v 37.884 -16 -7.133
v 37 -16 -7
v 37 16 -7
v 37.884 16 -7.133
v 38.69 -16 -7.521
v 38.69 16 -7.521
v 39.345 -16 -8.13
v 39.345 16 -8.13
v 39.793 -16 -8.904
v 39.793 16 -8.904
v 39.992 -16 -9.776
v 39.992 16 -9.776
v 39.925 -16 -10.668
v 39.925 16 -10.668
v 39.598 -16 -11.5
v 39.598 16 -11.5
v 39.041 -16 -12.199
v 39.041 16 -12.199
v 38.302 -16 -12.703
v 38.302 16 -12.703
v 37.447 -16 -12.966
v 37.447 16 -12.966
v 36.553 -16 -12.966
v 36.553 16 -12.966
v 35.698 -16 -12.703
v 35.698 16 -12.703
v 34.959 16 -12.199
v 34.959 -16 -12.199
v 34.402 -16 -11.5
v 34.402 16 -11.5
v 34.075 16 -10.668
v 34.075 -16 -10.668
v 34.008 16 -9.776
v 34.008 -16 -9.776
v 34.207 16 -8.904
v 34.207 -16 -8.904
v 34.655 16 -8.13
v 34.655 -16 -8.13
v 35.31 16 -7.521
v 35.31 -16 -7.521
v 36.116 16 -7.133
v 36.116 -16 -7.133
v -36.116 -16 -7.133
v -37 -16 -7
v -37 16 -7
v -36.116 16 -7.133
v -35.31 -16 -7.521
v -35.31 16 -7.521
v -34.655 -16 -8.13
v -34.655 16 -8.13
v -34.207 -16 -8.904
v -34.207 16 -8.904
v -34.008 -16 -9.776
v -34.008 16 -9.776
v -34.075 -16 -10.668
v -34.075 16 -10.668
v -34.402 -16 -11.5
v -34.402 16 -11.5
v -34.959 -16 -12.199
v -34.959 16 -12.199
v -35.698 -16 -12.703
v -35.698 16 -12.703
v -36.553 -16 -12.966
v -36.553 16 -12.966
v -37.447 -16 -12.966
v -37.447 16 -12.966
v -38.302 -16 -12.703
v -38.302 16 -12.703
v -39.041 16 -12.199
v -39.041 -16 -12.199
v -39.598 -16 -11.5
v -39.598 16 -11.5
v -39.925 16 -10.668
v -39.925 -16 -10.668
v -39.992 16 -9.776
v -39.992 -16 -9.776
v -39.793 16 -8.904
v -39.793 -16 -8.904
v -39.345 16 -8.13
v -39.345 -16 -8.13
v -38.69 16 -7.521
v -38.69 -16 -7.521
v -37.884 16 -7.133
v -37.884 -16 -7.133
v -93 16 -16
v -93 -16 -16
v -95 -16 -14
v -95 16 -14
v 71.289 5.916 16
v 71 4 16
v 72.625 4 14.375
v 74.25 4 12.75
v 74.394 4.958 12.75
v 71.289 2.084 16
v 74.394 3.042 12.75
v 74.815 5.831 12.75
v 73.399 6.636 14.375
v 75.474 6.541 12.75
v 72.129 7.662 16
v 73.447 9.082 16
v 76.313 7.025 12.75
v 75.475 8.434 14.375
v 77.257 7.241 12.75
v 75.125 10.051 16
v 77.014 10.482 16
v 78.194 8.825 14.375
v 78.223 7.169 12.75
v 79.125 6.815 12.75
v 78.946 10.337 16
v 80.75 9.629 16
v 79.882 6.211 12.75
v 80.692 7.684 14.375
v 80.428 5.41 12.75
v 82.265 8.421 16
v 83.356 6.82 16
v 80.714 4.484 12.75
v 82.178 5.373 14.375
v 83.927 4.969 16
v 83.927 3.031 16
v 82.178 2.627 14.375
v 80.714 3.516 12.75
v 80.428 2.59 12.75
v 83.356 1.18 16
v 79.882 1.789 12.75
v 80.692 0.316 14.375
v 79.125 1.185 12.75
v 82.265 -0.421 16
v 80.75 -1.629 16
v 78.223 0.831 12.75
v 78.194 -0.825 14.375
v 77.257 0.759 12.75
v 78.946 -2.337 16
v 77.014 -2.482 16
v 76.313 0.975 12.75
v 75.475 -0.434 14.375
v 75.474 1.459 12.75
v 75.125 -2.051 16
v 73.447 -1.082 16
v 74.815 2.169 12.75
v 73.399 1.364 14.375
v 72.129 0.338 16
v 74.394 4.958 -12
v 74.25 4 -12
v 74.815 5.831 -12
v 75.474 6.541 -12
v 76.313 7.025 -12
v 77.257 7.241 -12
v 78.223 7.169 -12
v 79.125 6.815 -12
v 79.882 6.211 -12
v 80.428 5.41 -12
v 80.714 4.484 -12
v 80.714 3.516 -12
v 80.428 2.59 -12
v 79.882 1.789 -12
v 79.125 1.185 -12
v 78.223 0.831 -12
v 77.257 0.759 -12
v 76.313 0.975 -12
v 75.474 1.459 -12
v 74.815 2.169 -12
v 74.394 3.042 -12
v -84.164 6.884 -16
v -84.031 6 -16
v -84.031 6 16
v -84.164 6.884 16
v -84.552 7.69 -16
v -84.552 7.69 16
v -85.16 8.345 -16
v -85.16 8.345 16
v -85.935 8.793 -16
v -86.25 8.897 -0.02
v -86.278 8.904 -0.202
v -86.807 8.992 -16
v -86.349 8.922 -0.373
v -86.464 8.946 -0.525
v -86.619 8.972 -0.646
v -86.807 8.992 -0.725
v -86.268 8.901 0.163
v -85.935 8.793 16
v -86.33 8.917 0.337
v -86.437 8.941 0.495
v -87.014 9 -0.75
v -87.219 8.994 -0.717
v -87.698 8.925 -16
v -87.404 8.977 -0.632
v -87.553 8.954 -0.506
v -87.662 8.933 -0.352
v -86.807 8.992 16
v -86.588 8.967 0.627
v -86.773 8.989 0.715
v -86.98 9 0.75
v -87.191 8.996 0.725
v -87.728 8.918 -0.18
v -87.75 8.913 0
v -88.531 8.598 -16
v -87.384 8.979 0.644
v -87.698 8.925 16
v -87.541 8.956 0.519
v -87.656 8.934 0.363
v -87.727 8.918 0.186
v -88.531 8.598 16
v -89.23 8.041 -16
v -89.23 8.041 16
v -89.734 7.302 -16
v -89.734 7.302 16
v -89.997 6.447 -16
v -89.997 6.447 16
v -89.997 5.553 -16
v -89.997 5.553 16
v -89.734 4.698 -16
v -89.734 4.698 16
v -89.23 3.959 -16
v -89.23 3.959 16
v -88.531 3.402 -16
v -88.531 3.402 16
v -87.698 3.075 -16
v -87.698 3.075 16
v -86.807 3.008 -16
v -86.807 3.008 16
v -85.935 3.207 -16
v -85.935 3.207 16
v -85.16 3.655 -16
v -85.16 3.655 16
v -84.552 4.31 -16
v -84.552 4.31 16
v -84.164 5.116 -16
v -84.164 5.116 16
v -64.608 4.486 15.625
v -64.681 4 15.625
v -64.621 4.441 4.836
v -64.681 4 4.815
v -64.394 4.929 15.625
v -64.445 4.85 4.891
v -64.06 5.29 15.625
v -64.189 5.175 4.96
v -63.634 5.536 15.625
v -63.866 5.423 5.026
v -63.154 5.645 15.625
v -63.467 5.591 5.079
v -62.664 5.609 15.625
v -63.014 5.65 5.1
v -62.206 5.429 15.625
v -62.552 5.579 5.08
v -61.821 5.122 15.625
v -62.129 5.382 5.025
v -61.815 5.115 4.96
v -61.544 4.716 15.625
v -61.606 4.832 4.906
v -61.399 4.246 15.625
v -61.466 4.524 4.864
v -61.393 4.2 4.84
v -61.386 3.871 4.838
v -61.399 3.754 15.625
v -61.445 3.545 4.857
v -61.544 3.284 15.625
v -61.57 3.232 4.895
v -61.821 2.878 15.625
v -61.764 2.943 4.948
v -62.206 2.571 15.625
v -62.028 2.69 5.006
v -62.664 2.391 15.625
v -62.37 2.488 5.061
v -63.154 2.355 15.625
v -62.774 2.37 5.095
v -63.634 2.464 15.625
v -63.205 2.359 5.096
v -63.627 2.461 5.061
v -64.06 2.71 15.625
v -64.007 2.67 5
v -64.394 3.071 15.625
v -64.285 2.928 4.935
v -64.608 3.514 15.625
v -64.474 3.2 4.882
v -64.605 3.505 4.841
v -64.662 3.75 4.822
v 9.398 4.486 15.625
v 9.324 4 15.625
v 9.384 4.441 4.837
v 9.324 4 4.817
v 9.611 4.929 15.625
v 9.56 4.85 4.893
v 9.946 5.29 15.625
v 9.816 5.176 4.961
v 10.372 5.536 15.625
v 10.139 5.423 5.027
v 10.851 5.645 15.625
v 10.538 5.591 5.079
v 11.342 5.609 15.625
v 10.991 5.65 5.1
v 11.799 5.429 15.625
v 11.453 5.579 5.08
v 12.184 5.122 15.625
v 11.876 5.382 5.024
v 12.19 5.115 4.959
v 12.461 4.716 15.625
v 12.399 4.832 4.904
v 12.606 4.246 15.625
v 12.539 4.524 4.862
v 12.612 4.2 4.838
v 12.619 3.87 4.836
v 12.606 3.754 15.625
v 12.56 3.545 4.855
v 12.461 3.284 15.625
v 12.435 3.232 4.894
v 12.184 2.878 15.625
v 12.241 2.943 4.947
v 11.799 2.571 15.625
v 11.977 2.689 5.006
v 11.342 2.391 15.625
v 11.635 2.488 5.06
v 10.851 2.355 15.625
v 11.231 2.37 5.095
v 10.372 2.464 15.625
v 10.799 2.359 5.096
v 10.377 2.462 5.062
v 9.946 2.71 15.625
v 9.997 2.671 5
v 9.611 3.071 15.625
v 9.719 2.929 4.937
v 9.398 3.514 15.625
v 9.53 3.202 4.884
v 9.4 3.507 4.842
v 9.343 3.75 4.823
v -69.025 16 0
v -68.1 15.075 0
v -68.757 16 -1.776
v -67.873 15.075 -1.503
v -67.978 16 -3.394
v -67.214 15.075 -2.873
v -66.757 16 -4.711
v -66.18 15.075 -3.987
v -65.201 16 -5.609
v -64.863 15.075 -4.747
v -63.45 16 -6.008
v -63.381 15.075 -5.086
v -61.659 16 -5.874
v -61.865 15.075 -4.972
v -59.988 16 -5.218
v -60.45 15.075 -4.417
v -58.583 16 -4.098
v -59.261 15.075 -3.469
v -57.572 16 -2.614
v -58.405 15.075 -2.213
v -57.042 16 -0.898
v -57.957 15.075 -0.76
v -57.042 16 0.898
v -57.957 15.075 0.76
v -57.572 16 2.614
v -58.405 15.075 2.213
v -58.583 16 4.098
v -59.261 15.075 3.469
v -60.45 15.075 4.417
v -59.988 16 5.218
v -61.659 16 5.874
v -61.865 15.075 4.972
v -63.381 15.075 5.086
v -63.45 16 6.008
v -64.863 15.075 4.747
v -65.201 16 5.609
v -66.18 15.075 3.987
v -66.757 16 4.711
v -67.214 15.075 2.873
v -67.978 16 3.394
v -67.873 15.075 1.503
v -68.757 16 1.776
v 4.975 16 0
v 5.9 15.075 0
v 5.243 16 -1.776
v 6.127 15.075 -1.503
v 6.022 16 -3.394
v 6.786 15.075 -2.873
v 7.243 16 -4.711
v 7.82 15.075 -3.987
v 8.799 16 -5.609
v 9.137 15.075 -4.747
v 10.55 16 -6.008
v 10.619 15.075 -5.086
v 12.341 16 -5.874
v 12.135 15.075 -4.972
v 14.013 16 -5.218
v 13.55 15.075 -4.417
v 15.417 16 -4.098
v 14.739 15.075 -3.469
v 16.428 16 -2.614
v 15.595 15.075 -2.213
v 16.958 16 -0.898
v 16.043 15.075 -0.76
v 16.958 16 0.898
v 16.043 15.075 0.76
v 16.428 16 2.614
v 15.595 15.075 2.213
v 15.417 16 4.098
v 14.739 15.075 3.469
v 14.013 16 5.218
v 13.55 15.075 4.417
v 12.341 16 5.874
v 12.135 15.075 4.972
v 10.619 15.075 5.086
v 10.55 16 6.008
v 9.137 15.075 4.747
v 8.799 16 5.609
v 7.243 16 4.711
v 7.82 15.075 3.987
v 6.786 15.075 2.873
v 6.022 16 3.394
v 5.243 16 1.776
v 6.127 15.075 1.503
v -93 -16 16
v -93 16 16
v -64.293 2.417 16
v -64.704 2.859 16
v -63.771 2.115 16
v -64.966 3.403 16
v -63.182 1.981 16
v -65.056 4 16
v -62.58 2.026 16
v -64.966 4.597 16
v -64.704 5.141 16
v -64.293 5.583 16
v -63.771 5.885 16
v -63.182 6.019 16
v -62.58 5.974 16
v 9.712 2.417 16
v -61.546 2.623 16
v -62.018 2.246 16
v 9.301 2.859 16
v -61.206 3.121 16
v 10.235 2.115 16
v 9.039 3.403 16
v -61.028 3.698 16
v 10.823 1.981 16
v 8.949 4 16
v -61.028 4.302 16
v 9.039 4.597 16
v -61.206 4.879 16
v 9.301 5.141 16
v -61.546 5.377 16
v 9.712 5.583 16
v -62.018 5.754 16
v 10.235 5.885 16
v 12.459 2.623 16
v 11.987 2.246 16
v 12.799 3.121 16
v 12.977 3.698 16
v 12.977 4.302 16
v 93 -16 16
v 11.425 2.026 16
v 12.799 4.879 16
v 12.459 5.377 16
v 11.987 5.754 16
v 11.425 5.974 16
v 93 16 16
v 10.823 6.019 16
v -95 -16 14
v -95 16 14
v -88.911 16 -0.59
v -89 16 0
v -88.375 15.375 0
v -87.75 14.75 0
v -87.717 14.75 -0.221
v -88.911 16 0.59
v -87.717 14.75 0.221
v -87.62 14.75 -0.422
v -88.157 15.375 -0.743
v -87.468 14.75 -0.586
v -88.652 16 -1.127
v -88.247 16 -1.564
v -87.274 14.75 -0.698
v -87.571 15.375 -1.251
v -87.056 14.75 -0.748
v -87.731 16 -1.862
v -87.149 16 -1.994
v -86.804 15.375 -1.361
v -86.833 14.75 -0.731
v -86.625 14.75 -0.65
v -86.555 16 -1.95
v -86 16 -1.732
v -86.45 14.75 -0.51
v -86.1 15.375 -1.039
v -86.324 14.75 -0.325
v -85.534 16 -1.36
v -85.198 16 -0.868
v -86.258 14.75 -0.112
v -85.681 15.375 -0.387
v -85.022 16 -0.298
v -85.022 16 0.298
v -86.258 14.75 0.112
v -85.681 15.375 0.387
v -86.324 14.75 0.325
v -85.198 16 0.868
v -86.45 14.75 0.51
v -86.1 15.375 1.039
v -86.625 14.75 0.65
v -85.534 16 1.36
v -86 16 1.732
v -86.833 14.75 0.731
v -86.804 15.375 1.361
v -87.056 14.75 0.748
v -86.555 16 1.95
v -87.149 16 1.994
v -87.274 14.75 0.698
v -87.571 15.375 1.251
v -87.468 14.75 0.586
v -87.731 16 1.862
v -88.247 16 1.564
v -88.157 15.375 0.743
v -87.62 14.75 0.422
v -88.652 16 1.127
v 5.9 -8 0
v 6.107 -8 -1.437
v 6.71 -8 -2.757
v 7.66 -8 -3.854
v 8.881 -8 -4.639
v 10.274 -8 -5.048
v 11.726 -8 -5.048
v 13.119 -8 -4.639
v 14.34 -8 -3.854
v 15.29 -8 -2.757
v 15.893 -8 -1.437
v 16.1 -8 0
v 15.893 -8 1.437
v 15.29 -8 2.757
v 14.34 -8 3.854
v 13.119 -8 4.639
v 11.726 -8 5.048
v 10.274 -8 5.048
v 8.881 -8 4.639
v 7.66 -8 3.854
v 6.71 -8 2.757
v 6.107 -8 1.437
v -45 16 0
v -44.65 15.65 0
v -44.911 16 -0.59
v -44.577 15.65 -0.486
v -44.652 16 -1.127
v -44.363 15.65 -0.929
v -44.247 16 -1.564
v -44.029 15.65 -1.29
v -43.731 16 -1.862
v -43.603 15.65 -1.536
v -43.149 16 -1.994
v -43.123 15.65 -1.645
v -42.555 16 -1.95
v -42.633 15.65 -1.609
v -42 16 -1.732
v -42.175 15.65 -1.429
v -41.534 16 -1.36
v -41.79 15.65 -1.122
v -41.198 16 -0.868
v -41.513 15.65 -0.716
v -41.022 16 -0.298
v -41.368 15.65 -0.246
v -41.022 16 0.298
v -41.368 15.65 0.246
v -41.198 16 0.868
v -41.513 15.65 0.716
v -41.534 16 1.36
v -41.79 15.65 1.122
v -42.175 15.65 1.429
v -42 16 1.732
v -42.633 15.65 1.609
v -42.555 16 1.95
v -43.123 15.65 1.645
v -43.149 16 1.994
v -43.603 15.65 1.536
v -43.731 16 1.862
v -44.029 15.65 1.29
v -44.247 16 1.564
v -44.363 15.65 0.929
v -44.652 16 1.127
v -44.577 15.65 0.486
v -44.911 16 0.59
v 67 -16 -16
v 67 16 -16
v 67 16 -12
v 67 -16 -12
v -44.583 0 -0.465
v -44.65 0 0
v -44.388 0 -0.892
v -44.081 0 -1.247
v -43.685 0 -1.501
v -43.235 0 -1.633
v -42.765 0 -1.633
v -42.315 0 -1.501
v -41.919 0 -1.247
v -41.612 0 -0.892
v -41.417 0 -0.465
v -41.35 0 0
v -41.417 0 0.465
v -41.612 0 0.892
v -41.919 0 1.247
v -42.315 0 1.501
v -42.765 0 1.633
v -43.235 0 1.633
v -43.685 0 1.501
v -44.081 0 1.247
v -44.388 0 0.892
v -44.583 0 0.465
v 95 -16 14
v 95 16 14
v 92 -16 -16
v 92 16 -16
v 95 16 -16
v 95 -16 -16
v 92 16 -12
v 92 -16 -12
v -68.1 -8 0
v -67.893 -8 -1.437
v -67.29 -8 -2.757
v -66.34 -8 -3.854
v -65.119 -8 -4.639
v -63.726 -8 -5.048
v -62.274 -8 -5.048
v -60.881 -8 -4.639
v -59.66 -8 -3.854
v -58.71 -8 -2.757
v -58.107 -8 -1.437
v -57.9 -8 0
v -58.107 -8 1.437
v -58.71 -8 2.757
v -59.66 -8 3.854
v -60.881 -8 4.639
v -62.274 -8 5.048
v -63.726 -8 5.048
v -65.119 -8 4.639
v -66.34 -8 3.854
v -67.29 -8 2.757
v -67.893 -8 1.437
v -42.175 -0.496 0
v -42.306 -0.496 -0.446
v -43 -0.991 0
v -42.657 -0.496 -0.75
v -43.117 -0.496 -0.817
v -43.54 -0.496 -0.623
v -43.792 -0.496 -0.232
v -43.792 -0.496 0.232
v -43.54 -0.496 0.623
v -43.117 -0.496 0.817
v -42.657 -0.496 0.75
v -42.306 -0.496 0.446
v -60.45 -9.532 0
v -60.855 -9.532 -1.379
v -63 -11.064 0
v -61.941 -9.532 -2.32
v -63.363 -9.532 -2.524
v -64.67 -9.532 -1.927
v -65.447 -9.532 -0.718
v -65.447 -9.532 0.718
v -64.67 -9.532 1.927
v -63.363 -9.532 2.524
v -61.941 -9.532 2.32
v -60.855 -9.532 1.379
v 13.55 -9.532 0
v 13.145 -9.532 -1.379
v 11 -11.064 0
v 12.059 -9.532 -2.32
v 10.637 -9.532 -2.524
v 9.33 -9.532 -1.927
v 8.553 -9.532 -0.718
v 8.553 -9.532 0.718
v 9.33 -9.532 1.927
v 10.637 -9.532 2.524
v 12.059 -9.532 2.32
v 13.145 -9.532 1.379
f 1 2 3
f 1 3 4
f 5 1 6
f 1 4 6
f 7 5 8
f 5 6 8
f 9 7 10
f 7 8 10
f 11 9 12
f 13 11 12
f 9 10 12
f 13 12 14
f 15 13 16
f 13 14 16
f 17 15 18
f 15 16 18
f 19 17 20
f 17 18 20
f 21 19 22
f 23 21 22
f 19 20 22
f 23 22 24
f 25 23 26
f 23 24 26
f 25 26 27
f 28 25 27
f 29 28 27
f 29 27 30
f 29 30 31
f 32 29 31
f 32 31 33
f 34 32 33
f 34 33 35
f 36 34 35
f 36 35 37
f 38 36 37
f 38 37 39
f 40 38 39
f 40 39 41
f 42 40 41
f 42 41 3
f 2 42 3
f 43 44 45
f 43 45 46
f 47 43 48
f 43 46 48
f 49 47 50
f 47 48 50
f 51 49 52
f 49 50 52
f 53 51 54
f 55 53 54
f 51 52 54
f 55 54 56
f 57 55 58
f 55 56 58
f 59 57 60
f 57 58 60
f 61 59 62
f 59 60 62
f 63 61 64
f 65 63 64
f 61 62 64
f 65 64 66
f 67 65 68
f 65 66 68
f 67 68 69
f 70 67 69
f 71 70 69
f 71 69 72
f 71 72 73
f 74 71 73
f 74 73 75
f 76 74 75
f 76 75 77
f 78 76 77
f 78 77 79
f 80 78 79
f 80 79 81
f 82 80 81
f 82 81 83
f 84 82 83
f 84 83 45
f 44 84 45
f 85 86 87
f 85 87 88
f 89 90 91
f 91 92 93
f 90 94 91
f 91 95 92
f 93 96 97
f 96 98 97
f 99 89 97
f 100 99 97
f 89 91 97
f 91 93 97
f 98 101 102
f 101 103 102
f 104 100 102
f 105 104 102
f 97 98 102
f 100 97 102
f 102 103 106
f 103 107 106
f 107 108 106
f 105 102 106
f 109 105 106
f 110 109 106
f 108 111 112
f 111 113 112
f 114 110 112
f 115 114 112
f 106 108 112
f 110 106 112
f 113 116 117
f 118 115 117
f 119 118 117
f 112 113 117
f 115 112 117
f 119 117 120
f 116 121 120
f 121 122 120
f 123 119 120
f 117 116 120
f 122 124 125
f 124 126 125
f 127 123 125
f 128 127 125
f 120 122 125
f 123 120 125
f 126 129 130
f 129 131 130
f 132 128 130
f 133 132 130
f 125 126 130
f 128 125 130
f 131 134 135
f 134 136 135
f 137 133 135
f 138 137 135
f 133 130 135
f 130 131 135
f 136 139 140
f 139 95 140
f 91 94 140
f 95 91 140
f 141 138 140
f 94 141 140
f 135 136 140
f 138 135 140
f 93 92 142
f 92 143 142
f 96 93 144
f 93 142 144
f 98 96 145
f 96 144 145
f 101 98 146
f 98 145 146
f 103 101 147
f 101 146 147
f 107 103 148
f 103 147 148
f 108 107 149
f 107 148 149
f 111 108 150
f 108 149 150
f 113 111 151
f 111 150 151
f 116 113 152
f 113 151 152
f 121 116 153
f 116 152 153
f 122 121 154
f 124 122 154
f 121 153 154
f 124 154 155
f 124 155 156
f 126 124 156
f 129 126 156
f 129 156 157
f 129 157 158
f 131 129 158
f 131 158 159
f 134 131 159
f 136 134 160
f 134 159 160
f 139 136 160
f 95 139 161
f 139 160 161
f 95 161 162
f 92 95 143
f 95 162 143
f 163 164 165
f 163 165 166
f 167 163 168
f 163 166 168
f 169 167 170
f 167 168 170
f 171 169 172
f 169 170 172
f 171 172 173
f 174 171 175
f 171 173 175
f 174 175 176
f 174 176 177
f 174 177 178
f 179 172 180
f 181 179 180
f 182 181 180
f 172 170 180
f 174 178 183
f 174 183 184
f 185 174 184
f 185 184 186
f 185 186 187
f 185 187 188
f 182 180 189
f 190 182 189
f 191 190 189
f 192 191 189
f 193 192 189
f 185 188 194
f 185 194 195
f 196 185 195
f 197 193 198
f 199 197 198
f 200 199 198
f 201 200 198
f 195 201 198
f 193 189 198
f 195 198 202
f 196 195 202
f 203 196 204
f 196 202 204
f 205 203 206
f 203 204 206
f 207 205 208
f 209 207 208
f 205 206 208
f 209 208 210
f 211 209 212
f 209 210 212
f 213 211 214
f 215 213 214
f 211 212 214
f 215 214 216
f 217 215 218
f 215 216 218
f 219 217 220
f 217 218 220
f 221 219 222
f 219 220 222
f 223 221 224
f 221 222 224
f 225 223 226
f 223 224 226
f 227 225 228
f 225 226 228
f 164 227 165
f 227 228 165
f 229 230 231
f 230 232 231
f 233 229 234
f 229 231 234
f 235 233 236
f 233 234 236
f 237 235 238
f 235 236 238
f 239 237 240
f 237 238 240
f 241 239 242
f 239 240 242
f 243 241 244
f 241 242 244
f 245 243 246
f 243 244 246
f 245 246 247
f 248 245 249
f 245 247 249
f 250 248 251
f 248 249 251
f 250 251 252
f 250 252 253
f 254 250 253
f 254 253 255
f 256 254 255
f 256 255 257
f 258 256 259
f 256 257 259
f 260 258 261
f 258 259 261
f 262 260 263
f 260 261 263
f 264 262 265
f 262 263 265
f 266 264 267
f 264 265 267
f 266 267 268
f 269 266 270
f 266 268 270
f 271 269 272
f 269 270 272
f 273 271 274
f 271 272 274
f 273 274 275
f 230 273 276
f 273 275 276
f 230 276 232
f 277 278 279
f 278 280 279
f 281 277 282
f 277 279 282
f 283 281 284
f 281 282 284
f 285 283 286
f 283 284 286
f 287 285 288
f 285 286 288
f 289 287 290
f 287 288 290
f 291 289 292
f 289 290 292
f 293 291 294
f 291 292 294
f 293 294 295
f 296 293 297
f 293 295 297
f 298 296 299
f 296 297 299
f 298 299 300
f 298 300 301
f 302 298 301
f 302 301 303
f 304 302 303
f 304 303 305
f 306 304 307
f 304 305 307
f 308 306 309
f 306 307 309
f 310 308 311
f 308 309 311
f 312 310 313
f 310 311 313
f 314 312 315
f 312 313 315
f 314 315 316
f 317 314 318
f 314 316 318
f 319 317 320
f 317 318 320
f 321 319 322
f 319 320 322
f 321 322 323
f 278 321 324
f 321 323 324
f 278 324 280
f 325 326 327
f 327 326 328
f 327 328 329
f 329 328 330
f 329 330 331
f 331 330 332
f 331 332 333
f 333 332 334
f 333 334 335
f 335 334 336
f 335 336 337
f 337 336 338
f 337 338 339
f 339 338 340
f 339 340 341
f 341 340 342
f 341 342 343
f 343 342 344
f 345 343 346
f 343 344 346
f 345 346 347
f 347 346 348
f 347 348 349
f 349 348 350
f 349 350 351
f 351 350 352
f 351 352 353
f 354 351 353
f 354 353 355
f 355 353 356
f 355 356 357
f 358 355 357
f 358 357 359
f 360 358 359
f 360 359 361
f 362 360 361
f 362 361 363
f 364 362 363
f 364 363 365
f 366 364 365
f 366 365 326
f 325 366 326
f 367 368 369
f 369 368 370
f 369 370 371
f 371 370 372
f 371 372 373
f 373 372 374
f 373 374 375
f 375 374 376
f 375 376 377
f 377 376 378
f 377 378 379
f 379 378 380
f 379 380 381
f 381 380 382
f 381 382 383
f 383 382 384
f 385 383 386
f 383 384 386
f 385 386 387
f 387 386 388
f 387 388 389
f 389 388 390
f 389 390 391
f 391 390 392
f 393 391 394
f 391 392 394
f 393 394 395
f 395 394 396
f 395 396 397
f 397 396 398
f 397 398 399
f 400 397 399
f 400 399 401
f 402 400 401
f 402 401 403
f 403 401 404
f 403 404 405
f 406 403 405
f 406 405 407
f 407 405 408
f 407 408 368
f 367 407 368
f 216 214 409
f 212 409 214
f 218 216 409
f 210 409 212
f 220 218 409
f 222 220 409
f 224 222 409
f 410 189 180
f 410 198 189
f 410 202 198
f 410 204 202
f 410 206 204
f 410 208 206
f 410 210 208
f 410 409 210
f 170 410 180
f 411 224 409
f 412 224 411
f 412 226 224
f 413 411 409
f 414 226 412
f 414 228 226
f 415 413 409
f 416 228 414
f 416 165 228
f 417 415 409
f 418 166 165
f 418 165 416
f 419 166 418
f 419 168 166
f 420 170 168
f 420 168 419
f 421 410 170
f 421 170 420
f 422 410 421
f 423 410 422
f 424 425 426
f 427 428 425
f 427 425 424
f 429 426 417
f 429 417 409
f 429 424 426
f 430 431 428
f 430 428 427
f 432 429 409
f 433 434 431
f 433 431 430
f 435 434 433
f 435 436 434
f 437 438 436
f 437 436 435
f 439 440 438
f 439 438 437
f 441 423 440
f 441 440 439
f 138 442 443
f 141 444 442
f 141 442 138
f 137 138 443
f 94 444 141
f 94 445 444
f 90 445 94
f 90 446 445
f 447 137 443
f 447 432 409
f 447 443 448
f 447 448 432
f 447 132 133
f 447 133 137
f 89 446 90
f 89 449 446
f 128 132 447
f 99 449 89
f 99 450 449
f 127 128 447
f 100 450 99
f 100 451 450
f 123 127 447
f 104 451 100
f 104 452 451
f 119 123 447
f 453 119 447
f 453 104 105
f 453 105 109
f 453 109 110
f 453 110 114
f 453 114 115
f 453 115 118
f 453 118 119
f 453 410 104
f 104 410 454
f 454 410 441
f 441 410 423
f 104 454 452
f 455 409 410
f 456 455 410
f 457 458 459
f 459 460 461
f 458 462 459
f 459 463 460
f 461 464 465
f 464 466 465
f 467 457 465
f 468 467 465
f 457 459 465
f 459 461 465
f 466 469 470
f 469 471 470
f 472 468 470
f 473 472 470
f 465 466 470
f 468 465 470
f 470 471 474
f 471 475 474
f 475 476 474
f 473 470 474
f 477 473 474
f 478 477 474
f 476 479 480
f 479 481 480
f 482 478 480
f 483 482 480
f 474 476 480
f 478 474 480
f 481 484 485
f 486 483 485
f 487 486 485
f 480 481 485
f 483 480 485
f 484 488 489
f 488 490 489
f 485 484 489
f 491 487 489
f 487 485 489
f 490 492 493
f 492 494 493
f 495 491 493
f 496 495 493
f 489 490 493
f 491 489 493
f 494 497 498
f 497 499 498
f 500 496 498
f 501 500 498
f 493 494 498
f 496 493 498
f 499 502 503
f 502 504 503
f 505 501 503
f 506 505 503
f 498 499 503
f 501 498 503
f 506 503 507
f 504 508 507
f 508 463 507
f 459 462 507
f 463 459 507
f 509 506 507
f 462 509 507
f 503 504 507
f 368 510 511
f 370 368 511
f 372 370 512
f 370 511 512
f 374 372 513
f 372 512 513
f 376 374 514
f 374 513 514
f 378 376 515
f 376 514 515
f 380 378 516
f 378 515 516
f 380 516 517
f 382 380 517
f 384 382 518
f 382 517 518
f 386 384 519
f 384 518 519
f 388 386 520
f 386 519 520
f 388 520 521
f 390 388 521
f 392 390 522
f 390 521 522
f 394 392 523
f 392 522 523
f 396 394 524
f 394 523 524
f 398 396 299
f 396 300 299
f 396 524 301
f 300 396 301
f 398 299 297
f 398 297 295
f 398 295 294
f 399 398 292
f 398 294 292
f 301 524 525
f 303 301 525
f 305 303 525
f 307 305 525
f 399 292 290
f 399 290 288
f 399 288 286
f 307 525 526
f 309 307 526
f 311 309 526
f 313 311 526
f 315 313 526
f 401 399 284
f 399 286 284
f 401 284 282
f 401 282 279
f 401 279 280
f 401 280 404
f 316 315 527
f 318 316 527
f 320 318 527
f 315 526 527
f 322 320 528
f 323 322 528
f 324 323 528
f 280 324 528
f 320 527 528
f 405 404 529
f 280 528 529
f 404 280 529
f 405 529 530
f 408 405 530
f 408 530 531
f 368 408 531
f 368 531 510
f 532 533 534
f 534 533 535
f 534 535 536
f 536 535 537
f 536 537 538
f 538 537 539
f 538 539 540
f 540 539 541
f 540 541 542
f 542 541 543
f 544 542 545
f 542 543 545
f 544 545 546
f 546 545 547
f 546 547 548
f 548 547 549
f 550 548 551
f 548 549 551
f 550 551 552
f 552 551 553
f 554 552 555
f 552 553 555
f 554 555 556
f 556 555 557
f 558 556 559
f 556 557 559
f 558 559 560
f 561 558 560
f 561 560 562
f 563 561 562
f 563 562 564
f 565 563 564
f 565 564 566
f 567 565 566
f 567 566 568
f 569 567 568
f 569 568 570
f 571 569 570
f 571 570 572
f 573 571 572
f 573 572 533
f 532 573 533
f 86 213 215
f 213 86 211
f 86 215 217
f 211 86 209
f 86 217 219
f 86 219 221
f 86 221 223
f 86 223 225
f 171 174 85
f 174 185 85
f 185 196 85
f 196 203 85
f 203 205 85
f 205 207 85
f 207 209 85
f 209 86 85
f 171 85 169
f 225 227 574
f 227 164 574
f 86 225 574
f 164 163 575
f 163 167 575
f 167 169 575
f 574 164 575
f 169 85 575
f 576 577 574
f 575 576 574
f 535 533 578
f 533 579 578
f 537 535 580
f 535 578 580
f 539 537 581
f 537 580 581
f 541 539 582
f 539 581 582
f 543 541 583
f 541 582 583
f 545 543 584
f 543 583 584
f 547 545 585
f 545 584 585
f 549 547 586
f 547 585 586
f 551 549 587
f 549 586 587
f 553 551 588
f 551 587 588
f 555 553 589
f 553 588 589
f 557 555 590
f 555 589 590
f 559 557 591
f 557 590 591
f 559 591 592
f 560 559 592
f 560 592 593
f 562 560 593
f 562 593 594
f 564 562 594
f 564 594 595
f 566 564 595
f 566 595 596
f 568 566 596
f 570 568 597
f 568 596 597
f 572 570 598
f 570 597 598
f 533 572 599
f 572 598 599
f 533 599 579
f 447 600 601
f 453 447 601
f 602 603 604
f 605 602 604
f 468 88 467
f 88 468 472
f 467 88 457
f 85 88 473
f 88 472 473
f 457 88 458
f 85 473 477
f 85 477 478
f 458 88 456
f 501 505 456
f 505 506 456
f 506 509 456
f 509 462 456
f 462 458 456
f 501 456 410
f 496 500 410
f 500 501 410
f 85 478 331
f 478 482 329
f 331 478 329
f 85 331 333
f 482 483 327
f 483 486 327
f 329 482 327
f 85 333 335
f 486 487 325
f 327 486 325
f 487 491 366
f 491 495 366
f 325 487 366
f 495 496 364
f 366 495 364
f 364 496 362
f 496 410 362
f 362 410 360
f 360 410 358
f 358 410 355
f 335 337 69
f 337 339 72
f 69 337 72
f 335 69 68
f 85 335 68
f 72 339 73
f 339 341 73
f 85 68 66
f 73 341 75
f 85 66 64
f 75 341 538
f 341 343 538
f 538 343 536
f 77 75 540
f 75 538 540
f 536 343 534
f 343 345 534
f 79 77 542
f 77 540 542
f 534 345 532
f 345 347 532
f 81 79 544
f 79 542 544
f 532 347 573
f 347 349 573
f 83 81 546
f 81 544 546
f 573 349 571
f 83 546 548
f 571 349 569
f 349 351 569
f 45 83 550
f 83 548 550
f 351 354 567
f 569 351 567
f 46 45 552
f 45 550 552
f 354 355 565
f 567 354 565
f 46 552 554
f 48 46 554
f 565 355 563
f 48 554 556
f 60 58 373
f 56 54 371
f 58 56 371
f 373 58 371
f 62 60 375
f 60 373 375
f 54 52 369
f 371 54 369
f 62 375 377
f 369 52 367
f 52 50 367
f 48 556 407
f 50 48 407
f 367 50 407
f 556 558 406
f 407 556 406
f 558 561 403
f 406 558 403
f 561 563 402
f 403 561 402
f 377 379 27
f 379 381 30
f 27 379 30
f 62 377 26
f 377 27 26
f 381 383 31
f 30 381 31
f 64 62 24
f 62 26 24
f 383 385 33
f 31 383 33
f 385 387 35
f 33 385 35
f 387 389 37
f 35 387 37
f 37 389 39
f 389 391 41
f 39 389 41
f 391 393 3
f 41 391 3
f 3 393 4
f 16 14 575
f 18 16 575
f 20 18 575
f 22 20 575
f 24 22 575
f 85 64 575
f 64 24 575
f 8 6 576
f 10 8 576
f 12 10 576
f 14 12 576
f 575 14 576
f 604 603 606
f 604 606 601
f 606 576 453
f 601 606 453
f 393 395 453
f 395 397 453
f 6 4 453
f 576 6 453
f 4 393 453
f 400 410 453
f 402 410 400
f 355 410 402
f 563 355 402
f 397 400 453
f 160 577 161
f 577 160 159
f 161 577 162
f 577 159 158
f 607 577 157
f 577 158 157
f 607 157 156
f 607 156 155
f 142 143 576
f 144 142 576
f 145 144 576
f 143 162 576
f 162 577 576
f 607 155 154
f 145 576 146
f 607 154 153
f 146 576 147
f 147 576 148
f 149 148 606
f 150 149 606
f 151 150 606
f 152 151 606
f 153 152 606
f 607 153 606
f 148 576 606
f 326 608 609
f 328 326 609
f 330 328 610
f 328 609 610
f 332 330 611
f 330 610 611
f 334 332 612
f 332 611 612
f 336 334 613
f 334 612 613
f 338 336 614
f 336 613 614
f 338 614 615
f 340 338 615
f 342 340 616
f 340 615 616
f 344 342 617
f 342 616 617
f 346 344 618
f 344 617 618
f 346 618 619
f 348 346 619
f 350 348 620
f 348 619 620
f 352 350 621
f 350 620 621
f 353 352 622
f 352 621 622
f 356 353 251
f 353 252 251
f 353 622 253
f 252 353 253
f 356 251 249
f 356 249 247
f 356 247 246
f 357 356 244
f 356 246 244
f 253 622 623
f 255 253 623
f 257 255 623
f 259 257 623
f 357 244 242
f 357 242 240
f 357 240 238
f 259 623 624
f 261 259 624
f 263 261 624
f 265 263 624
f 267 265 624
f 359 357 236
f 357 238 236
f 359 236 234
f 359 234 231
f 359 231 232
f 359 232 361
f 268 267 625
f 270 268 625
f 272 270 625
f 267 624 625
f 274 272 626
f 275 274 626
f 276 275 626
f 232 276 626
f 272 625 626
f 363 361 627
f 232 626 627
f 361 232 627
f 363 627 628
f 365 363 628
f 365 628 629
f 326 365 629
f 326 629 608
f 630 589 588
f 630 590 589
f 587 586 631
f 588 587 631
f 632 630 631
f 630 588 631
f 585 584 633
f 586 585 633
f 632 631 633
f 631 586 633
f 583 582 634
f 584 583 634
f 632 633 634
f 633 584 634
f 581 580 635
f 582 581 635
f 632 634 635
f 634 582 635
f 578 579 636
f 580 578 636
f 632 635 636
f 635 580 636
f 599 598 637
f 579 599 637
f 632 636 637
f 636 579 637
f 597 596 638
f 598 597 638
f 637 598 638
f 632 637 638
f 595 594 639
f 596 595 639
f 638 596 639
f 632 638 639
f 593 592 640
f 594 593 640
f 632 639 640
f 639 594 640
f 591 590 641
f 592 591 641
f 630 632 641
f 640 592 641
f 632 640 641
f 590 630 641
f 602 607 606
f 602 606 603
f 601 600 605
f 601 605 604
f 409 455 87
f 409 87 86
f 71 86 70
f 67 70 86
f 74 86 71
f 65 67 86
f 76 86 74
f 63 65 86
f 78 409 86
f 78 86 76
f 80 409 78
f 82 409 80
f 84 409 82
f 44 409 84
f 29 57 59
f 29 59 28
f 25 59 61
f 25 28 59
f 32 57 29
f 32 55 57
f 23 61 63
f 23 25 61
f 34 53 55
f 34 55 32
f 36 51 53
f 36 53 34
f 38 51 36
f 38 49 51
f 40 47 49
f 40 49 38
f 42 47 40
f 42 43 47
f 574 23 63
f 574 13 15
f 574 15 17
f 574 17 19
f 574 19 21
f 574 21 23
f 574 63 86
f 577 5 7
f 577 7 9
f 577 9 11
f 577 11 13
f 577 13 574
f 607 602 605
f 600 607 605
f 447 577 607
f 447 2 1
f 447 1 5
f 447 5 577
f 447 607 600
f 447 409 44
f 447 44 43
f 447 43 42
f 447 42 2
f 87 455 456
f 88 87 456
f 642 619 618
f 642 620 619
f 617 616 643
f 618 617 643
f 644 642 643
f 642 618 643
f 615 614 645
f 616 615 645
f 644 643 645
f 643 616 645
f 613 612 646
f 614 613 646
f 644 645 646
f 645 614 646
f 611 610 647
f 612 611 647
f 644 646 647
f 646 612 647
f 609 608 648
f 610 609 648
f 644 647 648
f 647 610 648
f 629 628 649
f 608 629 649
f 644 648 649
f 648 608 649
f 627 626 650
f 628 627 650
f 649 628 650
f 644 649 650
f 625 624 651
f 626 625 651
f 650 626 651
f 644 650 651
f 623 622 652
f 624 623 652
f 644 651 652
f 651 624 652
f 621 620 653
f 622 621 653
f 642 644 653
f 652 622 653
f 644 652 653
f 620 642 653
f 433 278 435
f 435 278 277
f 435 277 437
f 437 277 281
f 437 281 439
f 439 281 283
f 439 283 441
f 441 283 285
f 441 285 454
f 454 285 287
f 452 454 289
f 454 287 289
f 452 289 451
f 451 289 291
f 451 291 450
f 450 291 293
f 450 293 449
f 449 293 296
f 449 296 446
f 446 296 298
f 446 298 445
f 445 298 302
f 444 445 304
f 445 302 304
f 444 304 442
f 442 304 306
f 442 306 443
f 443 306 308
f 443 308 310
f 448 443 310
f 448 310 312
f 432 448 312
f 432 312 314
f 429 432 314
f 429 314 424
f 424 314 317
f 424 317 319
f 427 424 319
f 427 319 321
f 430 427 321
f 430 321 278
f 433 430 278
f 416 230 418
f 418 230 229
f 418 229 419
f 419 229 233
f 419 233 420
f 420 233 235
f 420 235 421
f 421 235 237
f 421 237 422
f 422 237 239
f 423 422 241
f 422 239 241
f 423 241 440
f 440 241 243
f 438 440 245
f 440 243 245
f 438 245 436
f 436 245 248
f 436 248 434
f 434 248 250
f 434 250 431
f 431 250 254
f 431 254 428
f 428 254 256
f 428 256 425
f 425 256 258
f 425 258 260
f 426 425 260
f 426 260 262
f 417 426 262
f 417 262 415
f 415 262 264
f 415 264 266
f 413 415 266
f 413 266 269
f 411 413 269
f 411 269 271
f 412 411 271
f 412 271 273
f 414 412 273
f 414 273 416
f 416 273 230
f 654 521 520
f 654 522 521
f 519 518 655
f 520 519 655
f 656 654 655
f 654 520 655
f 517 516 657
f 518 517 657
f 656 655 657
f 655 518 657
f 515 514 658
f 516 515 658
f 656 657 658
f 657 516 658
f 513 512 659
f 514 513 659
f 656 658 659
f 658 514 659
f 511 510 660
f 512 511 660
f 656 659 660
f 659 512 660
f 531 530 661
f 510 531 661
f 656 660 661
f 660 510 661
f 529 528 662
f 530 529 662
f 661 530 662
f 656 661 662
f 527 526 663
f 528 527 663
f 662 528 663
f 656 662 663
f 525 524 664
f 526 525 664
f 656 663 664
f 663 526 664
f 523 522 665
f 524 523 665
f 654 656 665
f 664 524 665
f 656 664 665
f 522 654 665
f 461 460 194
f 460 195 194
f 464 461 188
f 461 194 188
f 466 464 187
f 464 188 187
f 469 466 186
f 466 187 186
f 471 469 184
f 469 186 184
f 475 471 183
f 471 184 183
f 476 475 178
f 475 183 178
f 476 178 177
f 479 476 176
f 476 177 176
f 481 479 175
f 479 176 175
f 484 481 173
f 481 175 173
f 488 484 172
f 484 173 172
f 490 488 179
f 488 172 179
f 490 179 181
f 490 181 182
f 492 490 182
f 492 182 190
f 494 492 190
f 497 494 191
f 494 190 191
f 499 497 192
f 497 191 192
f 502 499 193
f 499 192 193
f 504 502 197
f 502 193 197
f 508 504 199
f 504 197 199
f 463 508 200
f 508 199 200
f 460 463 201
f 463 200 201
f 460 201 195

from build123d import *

# Parameters (mm, degrees)
SKETCH2_W                                            = 190
SKETCH2_H                                            = 32
BOSS_EXTRUDE2_DEPTH                                  = 16
CHAMFER1_SIZE                                        = 2
SKETCH3_W                                            = 25
SKETCH3_H                                            = 4
CUT_EXTRUDE1_DEPTH                                   = 102.513545894
M12_TAPPED_HOLE1_D                                   = 10.2
M12_TAPPED_HOLE1_DEPTH                               = 24
M12_TAPPED_HOLE1_CSINK_D                             = 12.05
M12_TAPPED_HOLE1_CSINK_ANGLE                         = 90
M12_TAPPED_HOLE1_TIP                                 = 3.064389157
M4_TAPPED_HOLE1_D                                    = 3.3
M4_TAPPED_HOLE1_DEPTH                                = 11.5
M4_TAPPED_HOLE1_CSINK_D                              = 4.05
M4_TAPPED_HOLE1_CSINK_ANGLE                          = 90
M4_TAPPED_HOLE1_TIP                                  = 0.991420021
CSK_FOR_M10_COUNTERSUNK_FLAT_HEAD_SCREW1_D           = 6.5
CSK_FOR_M10_COUNTERSUNK_FLAT_HEAD_SCREW1_CSINK_D     = 13
CSK_FOR_M10_COUNTERSUNK_FLAT_HEAD_SCREW1_CSINK_ANGLE = 90
SKETCH13_R                                           = 3
CUT_EXTRUDE2_DEPTH                                   = 102.513545894
CSK_FOR_M4_COUNTERSUNK_FLAT_HEAD_SCREW1_D            = 1.5
CSK_FOR_M4_COUNTERSUNK_FLAT_HEAD_SCREW1_DEPTH        = 10
CSK_FOR_M4_COUNTERSUNK_FLAT_HEAD_SCREW1_CSINK_D      = 4
CSK_FOR_M4_COUNTERSUNK_FLAT_HEAD_SCREW1_CSINK_ANGLE  = 90
CSK_FOR_M4_COUNTERSUNK_FLAT_HEAD_SCREW1_TIP          = 0.450645464
M4_TAPPED_HOLE2_D                                    = 3.3
M4_TAPPED_HOLE2_DEPTH                                = 16
M4_TAPPED_HOLE2_CSINK_D                              = 4
M4_TAPPED_HOLE2_CSINK_ANGLE                          = 90
M4_TAPPED_HOLE2_TIP                                  = 0.991420021
SKETCH19_R                                           = 3
CUT_EXTRUDE3_DEPTH                                   = 102.51354591


with BuildPart() as part:
    # Sketch2 → Boss-Extrude2 (new, symmetric)
    with BuildSketch(Plane.XY):
        Rectangle(SKETCH2_W, SKETCH2_H)
    extrude(amount=BOSS_EXTRUDE2_DEPTH, both=True)

    # Chamfer1
    chamfer1_edges = [part.edges().sort_by_distance(p)[0] for p in [
        (-95, 0, 16),
        (95, 0, 16),
        (-95, 0, -16),
    ]]
    chamfer(chamfer1_edges, length=CHAMFER1_SIZE)

    # Sketch3 → Cut-Extrude1 (cut, through all)
    with BuildSketch(Plane(origin=(0, 16, 0), x_dir=(1, 0, 0), z_dir=(0, 1, 0))):
        with Locations((79.5, 14)):
            Rectangle(SKETCH3_W, SKETCH3_H)
    extrude(amount=-CUT_EXTRUDE1_DEPTH, mode=Mode.SUBTRACT)

    # M12 Tapped Hole1
    with Locations(Plane(origin=(0, 16, 0), x_dir=(1, 0, 0), z_dir=(0, 1, 0))):
        with Locations((-63, 0), (11, 0)):
            CounterSinkHole(M12_TAPPED_HOLE1_D / 2, M12_TAPPED_HOLE1_CSINK_D / 2, depth=M12_TAPPED_HOLE1_DEPTH, counter_sink_angle=M12_TAPPED_HOLE1_CSINK_ANGLE)
            with Locations((0, 0, -(M12_TAPPED_HOLE1_DEPTH + M12_TAPPED_HOLE1_TIP / 2))):  # 118° drill point
                Cone(0, M12_TAPPED_HOLE1_D / 2, M12_TAPPED_HOLE1_TIP, mode=Mode.SUBTRACT)

    # M4 Tapped Hole1
    with Locations(Plane.XY.offset(16)):
        with Locations((-63.030813748, 4), (10.974374685, 4)):
            CounterSinkHole(M4_TAPPED_HOLE1_D / 2, M4_TAPPED_HOLE1_CSINK_D / 2, depth=M4_TAPPED_HOLE1_DEPTH, counter_sink_angle=M4_TAPPED_HOLE1_CSINK_ANGLE)
            with Locations((0, 0, -(M4_TAPPED_HOLE1_DEPTH + M4_TAPPED_HOLE1_TIP / 2))):  # 118° drill point
                Cone(0, M4_TAPPED_HOLE1_D / 2, M4_TAPPED_HOLE1_TIP, mode=Mode.SUBTRACT)

    # CSK for M10 Countersunk Flat Head Screw1 (through all)
    with Locations(Plane.XY.offset(16)):
        with Locations((77.5, 4)):
            CounterSinkHole(CSK_FOR_M10_COUNTERSUNK_FLAT_HEAD_SCREW1_D / 2, CSK_FOR_M10_COUNTERSUNK_FLAT_HEAD_SCREW1_CSINK_D / 2, counter_sink_angle=CSK_FOR_M10_COUNTERSUNK_FLAT_HEAD_SCREW1_CSINK_ANGLE)

    # Sketch13 → Cut-Extrude2 (cut, through all)
    with BuildSketch(Plane.XY.offset(16)):
        with Locations((-87.030813748, 6)):
            Circle(SKETCH13_R)
    extrude(amount=-CUT_EXTRUDE2_DEPTH, mode=Mode.SUBTRACT)

    # CSK for M4 Countersunk Flat Head Screw1
    with Locations(Plane(origin=(0, 16, 0), x_dir=(1, 0, 0), z_dir=(0, 1, 0))):
        with Locations((-87, 0)):
            CounterSinkHole(CSK_FOR_M4_COUNTERSUNK_FLAT_HEAD_SCREW1_D / 2, CSK_FOR_M4_COUNTERSUNK_FLAT_HEAD_SCREW1_CSINK_D / 2, depth=CSK_FOR_M4_COUNTERSUNK_FLAT_HEAD_SCREW1_DEPTH, counter_sink_angle=CSK_FOR_M4_COUNTERSUNK_FLAT_HEAD_SCREW1_CSINK_ANGLE)
            with Locations((0, 0, -(CSK_FOR_M4_COUNTERSUNK_FLAT_HEAD_SCREW1_DEPTH + CSK_FOR_M4_COUNTERSUNK_FLAT_HEAD_SCREW1_TIP / 2))):  # 118° drill point
                Cone(0, CSK_FOR_M4_COUNTERSUNK_FLAT_HEAD_SCREW1_D / 2, CSK_FOR_M4_COUNTERSUNK_FLAT_HEAD_SCREW1_TIP, mode=Mode.SUBTRACT)

    # M4 Tapped Hole2
    with Locations(Plane(origin=(0, 16, 0), x_dir=(1, 0, 0), z_dir=(0, 1, 0))):
        with Locations((-43, 0)):
            CounterSinkHole(M4_TAPPED_HOLE2_D / 2, M4_TAPPED_HOLE2_CSINK_D / 2, depth=M4_TAPPED_HOLE2_DEPTH, counter_sink_angle=M4_TAPPED_HOLE2_CSINK_ANGLE)
            with Locations((0, 0, -(M4_TAPPED_HOLE2_DEPTH + M4_TAPPED_HOLE2_TIP / 2))):  # 118° drill point
                Cone(0, M4_TAPPED_HOLE2_D / 2, M4_TAPPED_HOLE2_TIP, mode=Mode.SUBTRACT)

    # Sketch19 → Cut-Extrude3 (cut, through all)
    with BuildSketch(Plane(origin=(0, 16, 0), x_dir=(1, 0, 0), z_dir=(0, 1, 0))):
        with Locations(Location((-37, 10, 0), (0, 0, 270))):
            Circle(SKETCH19_R)
        with Locations(Location((37, 10, 0), (0, 0, 270))):
            Circle(SKETCH19_R)
    extrude(amount=-CUT_EXTRUDE3_DEPTH, mode=Mode.SUBTRACT)


solid = part.part
